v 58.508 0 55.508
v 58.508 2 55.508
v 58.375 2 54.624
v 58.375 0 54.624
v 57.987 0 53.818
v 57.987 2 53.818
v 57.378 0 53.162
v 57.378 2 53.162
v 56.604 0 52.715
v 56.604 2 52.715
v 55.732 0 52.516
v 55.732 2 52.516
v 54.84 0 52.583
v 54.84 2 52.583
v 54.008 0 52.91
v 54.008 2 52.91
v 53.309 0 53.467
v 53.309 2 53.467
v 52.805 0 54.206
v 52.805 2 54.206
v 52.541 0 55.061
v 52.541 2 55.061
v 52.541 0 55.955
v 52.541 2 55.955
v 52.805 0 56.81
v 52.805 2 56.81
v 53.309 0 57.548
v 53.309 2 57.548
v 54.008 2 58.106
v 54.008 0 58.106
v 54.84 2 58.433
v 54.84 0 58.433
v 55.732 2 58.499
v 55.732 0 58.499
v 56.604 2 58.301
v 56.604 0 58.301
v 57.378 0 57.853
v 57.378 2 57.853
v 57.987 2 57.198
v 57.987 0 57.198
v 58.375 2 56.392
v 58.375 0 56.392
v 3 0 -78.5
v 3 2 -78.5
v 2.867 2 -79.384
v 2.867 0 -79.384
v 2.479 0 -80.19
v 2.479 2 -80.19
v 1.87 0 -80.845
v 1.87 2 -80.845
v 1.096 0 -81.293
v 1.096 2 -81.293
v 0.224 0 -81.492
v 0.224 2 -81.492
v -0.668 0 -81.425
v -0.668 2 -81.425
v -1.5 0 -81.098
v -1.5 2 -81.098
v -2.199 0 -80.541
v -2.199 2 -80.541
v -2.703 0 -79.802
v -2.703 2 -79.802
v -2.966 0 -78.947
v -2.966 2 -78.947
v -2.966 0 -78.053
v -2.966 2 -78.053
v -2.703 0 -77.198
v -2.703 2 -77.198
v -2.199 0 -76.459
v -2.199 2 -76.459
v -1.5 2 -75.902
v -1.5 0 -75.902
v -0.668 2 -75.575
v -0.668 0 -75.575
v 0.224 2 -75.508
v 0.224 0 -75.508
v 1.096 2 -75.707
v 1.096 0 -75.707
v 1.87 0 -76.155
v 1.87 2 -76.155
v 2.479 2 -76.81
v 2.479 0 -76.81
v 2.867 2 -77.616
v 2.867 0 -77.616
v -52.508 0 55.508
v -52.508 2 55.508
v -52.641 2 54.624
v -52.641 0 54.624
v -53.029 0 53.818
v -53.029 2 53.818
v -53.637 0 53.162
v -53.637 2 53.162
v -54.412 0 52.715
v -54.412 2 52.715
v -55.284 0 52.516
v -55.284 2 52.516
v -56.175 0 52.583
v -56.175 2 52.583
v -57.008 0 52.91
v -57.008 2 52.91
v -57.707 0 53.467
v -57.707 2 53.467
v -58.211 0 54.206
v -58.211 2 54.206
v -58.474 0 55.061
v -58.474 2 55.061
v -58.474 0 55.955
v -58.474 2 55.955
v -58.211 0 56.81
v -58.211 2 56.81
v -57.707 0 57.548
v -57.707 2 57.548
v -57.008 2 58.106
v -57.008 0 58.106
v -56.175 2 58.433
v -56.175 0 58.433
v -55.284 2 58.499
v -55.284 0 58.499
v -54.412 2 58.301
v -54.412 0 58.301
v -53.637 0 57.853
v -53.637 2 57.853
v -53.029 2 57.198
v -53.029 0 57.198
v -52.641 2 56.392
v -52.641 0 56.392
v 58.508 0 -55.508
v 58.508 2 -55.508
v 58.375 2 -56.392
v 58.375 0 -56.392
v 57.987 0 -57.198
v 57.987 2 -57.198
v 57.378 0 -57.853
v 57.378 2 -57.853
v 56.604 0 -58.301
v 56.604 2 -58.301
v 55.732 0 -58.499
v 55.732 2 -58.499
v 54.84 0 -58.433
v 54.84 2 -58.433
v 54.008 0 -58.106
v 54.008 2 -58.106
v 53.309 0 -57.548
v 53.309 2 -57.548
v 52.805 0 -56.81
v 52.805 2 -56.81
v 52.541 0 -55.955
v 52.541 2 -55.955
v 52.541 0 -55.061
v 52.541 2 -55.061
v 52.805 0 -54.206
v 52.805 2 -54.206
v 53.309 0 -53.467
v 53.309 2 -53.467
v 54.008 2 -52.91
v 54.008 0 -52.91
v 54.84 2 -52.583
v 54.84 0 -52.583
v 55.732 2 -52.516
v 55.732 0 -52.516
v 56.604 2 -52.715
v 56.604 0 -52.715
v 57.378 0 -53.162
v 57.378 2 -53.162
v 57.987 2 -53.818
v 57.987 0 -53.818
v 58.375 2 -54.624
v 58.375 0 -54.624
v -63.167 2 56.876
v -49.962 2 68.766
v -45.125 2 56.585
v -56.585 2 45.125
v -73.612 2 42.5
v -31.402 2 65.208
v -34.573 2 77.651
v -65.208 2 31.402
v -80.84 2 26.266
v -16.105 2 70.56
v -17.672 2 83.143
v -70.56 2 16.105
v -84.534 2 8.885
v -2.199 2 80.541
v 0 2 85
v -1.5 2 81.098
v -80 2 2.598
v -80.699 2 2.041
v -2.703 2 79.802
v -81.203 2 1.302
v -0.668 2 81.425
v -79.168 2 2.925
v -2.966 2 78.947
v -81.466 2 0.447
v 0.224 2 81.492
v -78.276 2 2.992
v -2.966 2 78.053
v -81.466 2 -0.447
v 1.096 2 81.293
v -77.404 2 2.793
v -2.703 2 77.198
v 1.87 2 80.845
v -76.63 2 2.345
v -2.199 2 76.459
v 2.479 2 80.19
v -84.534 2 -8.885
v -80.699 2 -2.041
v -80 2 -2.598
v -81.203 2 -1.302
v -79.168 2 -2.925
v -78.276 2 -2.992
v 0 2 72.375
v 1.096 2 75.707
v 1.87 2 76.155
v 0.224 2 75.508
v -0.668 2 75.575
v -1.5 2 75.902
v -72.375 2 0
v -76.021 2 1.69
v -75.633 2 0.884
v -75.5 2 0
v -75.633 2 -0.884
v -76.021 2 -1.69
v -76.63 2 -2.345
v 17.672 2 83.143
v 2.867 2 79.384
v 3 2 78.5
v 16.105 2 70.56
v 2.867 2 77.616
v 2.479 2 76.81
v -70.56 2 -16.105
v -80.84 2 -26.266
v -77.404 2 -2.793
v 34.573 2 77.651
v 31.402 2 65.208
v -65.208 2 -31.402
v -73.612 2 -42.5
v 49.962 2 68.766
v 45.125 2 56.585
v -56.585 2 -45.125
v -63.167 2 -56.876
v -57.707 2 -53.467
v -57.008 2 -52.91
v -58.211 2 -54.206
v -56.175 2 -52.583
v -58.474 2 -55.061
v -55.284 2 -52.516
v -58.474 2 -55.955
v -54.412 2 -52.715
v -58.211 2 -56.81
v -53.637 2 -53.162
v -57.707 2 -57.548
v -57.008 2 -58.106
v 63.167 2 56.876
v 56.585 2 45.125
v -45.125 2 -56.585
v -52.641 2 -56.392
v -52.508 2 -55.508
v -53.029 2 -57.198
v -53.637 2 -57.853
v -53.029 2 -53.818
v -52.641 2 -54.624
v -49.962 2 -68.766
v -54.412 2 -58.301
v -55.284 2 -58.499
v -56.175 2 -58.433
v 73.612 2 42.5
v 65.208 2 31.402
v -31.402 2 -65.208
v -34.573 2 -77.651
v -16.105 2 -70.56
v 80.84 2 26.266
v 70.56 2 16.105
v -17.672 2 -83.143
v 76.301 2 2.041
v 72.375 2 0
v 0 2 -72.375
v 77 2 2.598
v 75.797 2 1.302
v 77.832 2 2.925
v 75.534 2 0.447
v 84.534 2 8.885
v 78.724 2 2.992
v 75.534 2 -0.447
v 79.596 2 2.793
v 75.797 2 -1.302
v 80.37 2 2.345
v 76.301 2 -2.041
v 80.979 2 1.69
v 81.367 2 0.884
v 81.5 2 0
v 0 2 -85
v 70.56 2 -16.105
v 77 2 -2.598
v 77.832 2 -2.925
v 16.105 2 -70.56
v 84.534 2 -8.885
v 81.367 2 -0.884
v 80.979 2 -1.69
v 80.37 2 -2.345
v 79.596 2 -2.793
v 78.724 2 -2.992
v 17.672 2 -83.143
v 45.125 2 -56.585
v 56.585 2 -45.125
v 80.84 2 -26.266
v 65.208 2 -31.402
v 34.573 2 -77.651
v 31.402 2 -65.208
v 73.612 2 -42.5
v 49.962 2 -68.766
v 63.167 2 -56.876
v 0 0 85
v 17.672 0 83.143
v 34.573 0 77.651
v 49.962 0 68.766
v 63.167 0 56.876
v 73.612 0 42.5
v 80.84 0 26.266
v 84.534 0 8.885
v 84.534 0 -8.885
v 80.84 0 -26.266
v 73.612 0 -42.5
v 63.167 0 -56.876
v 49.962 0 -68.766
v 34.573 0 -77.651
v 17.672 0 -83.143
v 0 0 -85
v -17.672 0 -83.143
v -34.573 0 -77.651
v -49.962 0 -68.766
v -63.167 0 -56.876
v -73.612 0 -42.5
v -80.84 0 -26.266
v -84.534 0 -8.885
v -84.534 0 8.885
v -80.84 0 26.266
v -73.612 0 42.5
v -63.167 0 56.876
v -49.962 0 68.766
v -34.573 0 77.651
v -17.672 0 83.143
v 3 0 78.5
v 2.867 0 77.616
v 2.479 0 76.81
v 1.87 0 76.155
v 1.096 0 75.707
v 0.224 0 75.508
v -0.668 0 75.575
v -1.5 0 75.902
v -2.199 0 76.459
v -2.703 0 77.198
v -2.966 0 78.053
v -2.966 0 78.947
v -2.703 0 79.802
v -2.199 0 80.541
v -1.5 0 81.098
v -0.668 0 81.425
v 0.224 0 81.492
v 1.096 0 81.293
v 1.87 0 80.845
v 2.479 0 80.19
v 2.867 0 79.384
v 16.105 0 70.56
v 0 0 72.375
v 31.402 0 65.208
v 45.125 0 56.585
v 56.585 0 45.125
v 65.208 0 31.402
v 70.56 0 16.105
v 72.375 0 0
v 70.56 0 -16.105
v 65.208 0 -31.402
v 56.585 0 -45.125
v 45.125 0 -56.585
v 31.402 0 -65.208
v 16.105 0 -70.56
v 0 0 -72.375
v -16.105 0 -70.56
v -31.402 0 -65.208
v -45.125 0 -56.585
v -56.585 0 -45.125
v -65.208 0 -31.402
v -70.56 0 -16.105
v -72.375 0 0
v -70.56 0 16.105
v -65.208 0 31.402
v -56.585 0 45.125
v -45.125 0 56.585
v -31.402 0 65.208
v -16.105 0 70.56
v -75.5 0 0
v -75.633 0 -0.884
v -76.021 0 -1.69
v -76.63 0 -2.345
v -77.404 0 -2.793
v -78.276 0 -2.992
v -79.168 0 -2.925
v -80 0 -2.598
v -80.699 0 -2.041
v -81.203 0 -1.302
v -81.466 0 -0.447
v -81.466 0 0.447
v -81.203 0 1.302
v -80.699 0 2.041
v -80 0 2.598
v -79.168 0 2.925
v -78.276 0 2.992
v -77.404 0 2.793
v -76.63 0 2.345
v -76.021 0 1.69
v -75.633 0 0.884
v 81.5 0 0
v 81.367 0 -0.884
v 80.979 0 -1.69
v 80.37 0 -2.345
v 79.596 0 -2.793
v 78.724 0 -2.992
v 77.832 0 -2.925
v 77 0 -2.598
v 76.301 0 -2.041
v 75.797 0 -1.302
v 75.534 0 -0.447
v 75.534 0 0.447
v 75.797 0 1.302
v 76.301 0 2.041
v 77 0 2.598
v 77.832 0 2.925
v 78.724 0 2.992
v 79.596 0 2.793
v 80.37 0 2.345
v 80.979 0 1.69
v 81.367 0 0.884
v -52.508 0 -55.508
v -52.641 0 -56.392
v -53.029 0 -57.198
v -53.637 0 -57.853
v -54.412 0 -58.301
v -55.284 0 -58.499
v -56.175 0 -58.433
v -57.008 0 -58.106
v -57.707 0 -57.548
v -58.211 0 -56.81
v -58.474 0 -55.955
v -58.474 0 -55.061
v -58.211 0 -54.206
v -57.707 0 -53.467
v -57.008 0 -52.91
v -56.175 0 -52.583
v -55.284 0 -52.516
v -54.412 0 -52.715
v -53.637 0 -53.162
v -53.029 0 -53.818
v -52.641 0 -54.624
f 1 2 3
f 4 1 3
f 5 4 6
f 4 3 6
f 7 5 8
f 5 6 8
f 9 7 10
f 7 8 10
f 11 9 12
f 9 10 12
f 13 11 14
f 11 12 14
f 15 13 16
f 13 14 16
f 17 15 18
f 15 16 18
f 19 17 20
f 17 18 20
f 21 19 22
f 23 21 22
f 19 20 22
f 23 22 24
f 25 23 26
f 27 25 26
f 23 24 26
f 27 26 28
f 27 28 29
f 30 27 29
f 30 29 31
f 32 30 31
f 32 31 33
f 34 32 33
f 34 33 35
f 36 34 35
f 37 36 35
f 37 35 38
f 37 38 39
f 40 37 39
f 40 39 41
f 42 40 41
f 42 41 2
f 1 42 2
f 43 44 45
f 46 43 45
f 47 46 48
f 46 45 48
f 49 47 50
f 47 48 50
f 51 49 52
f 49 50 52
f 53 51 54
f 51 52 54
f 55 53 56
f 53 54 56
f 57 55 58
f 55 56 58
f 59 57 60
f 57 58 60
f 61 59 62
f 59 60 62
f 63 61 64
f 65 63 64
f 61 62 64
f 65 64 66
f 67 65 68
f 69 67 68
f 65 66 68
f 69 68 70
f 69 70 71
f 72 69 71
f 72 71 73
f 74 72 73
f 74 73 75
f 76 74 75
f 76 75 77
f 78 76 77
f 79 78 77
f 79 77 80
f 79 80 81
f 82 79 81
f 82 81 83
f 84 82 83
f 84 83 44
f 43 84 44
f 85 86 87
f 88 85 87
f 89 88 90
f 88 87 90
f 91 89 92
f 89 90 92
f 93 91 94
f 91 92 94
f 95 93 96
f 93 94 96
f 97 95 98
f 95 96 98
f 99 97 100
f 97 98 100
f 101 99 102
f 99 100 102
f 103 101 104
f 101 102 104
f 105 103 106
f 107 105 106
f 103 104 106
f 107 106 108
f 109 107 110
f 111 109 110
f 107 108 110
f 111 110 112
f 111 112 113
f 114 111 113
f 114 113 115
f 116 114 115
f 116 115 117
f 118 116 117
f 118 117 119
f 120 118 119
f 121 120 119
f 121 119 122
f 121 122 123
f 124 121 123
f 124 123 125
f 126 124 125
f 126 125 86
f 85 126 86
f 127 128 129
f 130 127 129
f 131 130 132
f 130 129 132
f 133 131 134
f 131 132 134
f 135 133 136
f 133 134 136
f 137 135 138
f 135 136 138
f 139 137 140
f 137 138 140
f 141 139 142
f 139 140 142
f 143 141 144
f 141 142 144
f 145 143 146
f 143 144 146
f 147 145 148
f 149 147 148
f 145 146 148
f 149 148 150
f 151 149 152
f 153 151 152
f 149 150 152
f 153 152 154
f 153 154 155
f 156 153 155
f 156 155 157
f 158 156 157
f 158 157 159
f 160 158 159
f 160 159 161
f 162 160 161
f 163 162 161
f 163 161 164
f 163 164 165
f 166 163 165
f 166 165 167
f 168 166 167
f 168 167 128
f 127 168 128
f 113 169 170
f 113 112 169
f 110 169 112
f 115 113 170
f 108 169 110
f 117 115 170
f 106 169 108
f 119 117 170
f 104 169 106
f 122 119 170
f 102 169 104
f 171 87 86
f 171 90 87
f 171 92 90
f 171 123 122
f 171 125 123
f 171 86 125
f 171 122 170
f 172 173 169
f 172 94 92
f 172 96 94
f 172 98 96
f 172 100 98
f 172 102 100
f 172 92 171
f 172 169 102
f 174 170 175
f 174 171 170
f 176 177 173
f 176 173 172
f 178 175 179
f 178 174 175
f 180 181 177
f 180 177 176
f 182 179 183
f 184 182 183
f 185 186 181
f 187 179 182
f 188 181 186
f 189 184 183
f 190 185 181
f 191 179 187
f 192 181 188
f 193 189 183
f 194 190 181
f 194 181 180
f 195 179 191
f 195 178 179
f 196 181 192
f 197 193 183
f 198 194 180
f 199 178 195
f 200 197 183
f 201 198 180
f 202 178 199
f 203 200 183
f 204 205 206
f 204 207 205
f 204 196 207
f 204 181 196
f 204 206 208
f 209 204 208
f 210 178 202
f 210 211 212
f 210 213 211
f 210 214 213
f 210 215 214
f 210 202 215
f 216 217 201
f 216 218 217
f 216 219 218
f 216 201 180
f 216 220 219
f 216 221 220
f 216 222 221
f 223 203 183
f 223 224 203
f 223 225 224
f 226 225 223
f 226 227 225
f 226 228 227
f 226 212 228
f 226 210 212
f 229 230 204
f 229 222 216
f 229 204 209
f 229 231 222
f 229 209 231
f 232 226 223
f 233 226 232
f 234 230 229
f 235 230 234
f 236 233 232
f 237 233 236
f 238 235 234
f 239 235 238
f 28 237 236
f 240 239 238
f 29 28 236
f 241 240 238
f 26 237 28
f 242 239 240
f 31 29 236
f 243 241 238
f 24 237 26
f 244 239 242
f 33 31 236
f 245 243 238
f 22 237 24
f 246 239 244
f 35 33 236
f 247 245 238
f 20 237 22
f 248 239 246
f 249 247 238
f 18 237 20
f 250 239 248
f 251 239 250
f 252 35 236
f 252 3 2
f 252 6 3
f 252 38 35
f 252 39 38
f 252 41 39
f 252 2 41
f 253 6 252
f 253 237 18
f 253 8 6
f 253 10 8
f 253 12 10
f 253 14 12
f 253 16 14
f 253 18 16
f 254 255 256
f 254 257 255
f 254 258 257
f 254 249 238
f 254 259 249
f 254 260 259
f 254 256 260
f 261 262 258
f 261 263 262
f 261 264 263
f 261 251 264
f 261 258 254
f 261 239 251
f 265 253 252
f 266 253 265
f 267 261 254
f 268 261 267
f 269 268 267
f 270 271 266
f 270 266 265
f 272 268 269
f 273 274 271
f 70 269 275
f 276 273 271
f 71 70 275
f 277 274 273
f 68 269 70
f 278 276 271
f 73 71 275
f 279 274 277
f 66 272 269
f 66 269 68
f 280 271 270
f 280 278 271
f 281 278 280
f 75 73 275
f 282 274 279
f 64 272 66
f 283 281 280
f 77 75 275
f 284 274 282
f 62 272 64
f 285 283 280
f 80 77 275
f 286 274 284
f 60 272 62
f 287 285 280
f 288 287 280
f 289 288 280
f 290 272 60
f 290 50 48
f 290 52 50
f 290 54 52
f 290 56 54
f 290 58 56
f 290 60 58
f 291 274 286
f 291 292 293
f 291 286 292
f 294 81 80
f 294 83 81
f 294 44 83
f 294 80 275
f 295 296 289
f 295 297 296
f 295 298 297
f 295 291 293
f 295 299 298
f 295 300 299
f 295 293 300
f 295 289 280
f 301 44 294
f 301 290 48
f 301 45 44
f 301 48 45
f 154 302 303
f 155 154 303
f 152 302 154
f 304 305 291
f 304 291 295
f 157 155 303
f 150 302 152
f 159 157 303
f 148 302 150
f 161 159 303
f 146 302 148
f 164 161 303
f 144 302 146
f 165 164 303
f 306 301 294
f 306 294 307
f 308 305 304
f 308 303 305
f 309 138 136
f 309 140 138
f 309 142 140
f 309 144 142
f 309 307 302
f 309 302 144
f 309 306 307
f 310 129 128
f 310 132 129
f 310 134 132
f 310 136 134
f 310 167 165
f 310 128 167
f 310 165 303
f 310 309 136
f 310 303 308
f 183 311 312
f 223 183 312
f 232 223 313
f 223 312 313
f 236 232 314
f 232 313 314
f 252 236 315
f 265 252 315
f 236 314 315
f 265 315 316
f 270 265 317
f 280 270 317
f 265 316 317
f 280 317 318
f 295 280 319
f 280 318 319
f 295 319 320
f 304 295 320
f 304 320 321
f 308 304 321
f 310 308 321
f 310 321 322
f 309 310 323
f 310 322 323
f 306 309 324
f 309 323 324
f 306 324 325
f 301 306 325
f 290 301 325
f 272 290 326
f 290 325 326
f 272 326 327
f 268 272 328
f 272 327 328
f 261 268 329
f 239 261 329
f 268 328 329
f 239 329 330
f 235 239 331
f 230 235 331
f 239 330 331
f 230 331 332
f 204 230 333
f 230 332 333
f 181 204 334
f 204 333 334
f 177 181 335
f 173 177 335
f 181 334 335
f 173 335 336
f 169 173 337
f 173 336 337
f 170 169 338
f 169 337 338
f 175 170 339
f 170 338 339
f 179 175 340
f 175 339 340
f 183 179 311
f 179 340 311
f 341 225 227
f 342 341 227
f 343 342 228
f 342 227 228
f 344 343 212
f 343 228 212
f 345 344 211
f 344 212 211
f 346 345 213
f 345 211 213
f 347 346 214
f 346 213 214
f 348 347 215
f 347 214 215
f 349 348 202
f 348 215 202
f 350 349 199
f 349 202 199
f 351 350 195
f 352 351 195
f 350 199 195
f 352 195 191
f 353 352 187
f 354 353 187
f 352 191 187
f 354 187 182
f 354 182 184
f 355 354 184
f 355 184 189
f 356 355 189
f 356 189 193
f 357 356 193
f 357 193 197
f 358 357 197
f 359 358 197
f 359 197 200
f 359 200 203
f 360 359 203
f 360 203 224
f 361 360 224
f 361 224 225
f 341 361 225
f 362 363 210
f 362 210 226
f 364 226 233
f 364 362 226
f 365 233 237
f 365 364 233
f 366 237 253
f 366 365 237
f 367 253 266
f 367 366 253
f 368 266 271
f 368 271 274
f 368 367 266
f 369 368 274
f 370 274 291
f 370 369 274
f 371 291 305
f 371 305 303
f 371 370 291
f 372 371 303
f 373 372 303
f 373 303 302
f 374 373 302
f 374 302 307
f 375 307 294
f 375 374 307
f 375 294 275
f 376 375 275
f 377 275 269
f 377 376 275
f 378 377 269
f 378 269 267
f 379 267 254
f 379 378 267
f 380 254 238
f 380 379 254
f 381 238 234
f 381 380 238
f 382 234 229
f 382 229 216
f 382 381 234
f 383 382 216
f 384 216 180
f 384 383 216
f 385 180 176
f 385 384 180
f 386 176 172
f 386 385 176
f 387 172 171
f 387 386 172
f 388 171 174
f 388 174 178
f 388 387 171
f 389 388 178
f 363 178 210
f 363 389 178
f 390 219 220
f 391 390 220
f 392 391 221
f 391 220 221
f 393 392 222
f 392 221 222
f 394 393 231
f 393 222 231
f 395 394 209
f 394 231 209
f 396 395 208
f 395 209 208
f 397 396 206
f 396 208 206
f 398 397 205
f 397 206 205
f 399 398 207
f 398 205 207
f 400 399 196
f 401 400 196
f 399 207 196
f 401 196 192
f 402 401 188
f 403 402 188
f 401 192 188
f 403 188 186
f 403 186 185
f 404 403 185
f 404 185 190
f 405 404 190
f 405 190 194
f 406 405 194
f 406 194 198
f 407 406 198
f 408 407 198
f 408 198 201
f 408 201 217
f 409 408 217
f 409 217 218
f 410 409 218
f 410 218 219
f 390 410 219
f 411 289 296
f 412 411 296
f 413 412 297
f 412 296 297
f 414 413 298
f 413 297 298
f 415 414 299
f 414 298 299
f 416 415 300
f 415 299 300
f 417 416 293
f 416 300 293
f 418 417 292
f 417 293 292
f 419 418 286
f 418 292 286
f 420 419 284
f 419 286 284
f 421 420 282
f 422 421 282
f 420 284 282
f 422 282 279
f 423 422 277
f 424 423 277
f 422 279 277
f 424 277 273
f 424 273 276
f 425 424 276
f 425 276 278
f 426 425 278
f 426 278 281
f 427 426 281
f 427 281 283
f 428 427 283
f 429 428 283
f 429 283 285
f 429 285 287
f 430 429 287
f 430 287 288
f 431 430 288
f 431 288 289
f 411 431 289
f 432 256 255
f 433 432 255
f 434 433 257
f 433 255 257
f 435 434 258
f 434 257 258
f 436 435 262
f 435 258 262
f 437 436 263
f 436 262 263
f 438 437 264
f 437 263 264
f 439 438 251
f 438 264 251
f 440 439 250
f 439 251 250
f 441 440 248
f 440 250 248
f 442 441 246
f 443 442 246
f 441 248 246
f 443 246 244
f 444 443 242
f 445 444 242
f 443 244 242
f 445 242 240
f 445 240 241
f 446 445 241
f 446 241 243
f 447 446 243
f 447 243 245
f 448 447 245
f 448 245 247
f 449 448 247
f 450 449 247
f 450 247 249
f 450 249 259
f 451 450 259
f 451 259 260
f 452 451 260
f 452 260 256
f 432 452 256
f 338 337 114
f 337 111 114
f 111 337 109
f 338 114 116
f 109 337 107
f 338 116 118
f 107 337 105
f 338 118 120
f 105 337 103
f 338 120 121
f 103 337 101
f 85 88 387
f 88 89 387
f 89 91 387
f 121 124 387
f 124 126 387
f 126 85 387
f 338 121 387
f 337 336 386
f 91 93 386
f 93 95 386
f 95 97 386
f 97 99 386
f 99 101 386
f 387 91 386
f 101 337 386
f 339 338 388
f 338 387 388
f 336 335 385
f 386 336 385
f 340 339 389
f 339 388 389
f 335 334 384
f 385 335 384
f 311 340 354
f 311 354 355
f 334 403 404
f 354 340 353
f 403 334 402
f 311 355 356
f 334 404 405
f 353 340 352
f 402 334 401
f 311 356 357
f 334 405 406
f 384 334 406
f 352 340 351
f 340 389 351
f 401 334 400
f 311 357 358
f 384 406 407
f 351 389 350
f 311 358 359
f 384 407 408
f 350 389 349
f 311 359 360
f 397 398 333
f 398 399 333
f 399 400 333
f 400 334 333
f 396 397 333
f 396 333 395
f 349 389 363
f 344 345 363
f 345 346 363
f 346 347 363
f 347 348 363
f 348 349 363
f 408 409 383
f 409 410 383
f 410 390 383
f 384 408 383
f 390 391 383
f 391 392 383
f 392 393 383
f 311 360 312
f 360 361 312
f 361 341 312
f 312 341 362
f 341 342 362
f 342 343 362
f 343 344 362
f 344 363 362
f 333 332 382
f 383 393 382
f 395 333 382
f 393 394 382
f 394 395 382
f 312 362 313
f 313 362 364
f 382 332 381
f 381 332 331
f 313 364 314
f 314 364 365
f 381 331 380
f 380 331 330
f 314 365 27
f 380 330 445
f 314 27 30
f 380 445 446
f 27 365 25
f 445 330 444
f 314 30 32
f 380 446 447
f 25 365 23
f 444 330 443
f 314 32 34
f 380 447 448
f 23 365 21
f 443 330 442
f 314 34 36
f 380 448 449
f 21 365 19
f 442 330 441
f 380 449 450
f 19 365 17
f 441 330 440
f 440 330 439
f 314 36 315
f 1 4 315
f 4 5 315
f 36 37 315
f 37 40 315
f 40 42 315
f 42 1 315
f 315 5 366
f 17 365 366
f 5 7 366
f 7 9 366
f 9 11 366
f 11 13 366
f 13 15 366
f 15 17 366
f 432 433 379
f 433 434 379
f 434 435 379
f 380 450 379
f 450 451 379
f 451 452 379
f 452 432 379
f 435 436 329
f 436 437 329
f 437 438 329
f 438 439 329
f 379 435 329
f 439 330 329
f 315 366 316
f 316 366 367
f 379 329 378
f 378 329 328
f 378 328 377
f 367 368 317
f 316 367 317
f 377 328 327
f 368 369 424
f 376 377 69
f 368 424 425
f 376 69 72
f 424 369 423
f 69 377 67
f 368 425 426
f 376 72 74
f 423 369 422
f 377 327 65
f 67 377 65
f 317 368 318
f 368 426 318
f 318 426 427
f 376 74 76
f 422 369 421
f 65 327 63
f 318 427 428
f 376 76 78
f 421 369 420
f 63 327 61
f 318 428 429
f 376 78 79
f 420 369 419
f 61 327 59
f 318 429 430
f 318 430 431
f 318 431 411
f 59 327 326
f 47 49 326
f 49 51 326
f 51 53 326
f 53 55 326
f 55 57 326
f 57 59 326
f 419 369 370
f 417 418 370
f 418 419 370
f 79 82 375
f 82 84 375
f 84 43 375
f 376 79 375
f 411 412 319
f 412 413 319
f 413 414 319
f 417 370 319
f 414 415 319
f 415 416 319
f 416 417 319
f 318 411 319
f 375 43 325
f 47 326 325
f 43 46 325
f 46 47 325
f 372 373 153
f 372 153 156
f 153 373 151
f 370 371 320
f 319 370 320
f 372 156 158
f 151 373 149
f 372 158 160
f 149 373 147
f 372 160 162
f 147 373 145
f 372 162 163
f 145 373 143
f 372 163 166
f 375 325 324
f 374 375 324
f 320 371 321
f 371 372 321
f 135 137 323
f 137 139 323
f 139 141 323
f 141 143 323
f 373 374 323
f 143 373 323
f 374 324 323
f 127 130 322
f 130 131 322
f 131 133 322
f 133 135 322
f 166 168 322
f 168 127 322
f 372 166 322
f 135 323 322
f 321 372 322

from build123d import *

# Parameters (mm, degrees)
SKETCH1_R             = 85
SKETCH1_R_2           = 78.5
SKETCH1_R_3           = 72.375
BOSS_EXTRUDE1_DEPTH   = 2
F_6_0MM_DOWEL_HOLE1_D = 6


with BuildPart() as part:
    # Sketch1 → Boss-Extrude1 (new body)
    # profile 1 of 2: a face of its own
    with BuildSketch(Plane(origin=(0, 0, 0), x_dir=(1, 0, 0), z_dir=(0, 1, 0))):
        with Locations(Location((0, 0, 0), (0, 0, 270))):
            Circle(SKETCH1_R)
        Circle(SKETCH1_R_2, mode=Mode.SUBTRACT)
    # profile 2 of 2: a face of its own
    with BuildSketch(Plane(origin=(0, 0, 0), x_dir=(1, 0, 0), z_dir=(0, 1, 0))):
        Circle(SKETCH1_R_2)
        with Locations(Location((0, 0, 0), (0, 0, 270))):
            Circle(SKETCH1_R_3, mode=Mode.SUBTRACT)
    extrude(amount=BOSS_EXTRUDE1_DEPTH)

    # Ø6.0mm Dowel Hole1 (through all)
    with Locations(Plane(origin=(0, 0, 0), x_dir=(-1, 0, 0), z_dir=(0, -1, 0))):
        with Locations((-55.507882323, 55.507882323), (0, 78.5), (55.507882323, 55.507882323), (78.5, 0), (55.507882323, -55.507882323), (0, -78.5), (-55.507882323, -55.507882323), (-78.5, 0)):
            Hole(F_6_0MM_DOWEL_HOLE1_D / 2)


solid = part.part
